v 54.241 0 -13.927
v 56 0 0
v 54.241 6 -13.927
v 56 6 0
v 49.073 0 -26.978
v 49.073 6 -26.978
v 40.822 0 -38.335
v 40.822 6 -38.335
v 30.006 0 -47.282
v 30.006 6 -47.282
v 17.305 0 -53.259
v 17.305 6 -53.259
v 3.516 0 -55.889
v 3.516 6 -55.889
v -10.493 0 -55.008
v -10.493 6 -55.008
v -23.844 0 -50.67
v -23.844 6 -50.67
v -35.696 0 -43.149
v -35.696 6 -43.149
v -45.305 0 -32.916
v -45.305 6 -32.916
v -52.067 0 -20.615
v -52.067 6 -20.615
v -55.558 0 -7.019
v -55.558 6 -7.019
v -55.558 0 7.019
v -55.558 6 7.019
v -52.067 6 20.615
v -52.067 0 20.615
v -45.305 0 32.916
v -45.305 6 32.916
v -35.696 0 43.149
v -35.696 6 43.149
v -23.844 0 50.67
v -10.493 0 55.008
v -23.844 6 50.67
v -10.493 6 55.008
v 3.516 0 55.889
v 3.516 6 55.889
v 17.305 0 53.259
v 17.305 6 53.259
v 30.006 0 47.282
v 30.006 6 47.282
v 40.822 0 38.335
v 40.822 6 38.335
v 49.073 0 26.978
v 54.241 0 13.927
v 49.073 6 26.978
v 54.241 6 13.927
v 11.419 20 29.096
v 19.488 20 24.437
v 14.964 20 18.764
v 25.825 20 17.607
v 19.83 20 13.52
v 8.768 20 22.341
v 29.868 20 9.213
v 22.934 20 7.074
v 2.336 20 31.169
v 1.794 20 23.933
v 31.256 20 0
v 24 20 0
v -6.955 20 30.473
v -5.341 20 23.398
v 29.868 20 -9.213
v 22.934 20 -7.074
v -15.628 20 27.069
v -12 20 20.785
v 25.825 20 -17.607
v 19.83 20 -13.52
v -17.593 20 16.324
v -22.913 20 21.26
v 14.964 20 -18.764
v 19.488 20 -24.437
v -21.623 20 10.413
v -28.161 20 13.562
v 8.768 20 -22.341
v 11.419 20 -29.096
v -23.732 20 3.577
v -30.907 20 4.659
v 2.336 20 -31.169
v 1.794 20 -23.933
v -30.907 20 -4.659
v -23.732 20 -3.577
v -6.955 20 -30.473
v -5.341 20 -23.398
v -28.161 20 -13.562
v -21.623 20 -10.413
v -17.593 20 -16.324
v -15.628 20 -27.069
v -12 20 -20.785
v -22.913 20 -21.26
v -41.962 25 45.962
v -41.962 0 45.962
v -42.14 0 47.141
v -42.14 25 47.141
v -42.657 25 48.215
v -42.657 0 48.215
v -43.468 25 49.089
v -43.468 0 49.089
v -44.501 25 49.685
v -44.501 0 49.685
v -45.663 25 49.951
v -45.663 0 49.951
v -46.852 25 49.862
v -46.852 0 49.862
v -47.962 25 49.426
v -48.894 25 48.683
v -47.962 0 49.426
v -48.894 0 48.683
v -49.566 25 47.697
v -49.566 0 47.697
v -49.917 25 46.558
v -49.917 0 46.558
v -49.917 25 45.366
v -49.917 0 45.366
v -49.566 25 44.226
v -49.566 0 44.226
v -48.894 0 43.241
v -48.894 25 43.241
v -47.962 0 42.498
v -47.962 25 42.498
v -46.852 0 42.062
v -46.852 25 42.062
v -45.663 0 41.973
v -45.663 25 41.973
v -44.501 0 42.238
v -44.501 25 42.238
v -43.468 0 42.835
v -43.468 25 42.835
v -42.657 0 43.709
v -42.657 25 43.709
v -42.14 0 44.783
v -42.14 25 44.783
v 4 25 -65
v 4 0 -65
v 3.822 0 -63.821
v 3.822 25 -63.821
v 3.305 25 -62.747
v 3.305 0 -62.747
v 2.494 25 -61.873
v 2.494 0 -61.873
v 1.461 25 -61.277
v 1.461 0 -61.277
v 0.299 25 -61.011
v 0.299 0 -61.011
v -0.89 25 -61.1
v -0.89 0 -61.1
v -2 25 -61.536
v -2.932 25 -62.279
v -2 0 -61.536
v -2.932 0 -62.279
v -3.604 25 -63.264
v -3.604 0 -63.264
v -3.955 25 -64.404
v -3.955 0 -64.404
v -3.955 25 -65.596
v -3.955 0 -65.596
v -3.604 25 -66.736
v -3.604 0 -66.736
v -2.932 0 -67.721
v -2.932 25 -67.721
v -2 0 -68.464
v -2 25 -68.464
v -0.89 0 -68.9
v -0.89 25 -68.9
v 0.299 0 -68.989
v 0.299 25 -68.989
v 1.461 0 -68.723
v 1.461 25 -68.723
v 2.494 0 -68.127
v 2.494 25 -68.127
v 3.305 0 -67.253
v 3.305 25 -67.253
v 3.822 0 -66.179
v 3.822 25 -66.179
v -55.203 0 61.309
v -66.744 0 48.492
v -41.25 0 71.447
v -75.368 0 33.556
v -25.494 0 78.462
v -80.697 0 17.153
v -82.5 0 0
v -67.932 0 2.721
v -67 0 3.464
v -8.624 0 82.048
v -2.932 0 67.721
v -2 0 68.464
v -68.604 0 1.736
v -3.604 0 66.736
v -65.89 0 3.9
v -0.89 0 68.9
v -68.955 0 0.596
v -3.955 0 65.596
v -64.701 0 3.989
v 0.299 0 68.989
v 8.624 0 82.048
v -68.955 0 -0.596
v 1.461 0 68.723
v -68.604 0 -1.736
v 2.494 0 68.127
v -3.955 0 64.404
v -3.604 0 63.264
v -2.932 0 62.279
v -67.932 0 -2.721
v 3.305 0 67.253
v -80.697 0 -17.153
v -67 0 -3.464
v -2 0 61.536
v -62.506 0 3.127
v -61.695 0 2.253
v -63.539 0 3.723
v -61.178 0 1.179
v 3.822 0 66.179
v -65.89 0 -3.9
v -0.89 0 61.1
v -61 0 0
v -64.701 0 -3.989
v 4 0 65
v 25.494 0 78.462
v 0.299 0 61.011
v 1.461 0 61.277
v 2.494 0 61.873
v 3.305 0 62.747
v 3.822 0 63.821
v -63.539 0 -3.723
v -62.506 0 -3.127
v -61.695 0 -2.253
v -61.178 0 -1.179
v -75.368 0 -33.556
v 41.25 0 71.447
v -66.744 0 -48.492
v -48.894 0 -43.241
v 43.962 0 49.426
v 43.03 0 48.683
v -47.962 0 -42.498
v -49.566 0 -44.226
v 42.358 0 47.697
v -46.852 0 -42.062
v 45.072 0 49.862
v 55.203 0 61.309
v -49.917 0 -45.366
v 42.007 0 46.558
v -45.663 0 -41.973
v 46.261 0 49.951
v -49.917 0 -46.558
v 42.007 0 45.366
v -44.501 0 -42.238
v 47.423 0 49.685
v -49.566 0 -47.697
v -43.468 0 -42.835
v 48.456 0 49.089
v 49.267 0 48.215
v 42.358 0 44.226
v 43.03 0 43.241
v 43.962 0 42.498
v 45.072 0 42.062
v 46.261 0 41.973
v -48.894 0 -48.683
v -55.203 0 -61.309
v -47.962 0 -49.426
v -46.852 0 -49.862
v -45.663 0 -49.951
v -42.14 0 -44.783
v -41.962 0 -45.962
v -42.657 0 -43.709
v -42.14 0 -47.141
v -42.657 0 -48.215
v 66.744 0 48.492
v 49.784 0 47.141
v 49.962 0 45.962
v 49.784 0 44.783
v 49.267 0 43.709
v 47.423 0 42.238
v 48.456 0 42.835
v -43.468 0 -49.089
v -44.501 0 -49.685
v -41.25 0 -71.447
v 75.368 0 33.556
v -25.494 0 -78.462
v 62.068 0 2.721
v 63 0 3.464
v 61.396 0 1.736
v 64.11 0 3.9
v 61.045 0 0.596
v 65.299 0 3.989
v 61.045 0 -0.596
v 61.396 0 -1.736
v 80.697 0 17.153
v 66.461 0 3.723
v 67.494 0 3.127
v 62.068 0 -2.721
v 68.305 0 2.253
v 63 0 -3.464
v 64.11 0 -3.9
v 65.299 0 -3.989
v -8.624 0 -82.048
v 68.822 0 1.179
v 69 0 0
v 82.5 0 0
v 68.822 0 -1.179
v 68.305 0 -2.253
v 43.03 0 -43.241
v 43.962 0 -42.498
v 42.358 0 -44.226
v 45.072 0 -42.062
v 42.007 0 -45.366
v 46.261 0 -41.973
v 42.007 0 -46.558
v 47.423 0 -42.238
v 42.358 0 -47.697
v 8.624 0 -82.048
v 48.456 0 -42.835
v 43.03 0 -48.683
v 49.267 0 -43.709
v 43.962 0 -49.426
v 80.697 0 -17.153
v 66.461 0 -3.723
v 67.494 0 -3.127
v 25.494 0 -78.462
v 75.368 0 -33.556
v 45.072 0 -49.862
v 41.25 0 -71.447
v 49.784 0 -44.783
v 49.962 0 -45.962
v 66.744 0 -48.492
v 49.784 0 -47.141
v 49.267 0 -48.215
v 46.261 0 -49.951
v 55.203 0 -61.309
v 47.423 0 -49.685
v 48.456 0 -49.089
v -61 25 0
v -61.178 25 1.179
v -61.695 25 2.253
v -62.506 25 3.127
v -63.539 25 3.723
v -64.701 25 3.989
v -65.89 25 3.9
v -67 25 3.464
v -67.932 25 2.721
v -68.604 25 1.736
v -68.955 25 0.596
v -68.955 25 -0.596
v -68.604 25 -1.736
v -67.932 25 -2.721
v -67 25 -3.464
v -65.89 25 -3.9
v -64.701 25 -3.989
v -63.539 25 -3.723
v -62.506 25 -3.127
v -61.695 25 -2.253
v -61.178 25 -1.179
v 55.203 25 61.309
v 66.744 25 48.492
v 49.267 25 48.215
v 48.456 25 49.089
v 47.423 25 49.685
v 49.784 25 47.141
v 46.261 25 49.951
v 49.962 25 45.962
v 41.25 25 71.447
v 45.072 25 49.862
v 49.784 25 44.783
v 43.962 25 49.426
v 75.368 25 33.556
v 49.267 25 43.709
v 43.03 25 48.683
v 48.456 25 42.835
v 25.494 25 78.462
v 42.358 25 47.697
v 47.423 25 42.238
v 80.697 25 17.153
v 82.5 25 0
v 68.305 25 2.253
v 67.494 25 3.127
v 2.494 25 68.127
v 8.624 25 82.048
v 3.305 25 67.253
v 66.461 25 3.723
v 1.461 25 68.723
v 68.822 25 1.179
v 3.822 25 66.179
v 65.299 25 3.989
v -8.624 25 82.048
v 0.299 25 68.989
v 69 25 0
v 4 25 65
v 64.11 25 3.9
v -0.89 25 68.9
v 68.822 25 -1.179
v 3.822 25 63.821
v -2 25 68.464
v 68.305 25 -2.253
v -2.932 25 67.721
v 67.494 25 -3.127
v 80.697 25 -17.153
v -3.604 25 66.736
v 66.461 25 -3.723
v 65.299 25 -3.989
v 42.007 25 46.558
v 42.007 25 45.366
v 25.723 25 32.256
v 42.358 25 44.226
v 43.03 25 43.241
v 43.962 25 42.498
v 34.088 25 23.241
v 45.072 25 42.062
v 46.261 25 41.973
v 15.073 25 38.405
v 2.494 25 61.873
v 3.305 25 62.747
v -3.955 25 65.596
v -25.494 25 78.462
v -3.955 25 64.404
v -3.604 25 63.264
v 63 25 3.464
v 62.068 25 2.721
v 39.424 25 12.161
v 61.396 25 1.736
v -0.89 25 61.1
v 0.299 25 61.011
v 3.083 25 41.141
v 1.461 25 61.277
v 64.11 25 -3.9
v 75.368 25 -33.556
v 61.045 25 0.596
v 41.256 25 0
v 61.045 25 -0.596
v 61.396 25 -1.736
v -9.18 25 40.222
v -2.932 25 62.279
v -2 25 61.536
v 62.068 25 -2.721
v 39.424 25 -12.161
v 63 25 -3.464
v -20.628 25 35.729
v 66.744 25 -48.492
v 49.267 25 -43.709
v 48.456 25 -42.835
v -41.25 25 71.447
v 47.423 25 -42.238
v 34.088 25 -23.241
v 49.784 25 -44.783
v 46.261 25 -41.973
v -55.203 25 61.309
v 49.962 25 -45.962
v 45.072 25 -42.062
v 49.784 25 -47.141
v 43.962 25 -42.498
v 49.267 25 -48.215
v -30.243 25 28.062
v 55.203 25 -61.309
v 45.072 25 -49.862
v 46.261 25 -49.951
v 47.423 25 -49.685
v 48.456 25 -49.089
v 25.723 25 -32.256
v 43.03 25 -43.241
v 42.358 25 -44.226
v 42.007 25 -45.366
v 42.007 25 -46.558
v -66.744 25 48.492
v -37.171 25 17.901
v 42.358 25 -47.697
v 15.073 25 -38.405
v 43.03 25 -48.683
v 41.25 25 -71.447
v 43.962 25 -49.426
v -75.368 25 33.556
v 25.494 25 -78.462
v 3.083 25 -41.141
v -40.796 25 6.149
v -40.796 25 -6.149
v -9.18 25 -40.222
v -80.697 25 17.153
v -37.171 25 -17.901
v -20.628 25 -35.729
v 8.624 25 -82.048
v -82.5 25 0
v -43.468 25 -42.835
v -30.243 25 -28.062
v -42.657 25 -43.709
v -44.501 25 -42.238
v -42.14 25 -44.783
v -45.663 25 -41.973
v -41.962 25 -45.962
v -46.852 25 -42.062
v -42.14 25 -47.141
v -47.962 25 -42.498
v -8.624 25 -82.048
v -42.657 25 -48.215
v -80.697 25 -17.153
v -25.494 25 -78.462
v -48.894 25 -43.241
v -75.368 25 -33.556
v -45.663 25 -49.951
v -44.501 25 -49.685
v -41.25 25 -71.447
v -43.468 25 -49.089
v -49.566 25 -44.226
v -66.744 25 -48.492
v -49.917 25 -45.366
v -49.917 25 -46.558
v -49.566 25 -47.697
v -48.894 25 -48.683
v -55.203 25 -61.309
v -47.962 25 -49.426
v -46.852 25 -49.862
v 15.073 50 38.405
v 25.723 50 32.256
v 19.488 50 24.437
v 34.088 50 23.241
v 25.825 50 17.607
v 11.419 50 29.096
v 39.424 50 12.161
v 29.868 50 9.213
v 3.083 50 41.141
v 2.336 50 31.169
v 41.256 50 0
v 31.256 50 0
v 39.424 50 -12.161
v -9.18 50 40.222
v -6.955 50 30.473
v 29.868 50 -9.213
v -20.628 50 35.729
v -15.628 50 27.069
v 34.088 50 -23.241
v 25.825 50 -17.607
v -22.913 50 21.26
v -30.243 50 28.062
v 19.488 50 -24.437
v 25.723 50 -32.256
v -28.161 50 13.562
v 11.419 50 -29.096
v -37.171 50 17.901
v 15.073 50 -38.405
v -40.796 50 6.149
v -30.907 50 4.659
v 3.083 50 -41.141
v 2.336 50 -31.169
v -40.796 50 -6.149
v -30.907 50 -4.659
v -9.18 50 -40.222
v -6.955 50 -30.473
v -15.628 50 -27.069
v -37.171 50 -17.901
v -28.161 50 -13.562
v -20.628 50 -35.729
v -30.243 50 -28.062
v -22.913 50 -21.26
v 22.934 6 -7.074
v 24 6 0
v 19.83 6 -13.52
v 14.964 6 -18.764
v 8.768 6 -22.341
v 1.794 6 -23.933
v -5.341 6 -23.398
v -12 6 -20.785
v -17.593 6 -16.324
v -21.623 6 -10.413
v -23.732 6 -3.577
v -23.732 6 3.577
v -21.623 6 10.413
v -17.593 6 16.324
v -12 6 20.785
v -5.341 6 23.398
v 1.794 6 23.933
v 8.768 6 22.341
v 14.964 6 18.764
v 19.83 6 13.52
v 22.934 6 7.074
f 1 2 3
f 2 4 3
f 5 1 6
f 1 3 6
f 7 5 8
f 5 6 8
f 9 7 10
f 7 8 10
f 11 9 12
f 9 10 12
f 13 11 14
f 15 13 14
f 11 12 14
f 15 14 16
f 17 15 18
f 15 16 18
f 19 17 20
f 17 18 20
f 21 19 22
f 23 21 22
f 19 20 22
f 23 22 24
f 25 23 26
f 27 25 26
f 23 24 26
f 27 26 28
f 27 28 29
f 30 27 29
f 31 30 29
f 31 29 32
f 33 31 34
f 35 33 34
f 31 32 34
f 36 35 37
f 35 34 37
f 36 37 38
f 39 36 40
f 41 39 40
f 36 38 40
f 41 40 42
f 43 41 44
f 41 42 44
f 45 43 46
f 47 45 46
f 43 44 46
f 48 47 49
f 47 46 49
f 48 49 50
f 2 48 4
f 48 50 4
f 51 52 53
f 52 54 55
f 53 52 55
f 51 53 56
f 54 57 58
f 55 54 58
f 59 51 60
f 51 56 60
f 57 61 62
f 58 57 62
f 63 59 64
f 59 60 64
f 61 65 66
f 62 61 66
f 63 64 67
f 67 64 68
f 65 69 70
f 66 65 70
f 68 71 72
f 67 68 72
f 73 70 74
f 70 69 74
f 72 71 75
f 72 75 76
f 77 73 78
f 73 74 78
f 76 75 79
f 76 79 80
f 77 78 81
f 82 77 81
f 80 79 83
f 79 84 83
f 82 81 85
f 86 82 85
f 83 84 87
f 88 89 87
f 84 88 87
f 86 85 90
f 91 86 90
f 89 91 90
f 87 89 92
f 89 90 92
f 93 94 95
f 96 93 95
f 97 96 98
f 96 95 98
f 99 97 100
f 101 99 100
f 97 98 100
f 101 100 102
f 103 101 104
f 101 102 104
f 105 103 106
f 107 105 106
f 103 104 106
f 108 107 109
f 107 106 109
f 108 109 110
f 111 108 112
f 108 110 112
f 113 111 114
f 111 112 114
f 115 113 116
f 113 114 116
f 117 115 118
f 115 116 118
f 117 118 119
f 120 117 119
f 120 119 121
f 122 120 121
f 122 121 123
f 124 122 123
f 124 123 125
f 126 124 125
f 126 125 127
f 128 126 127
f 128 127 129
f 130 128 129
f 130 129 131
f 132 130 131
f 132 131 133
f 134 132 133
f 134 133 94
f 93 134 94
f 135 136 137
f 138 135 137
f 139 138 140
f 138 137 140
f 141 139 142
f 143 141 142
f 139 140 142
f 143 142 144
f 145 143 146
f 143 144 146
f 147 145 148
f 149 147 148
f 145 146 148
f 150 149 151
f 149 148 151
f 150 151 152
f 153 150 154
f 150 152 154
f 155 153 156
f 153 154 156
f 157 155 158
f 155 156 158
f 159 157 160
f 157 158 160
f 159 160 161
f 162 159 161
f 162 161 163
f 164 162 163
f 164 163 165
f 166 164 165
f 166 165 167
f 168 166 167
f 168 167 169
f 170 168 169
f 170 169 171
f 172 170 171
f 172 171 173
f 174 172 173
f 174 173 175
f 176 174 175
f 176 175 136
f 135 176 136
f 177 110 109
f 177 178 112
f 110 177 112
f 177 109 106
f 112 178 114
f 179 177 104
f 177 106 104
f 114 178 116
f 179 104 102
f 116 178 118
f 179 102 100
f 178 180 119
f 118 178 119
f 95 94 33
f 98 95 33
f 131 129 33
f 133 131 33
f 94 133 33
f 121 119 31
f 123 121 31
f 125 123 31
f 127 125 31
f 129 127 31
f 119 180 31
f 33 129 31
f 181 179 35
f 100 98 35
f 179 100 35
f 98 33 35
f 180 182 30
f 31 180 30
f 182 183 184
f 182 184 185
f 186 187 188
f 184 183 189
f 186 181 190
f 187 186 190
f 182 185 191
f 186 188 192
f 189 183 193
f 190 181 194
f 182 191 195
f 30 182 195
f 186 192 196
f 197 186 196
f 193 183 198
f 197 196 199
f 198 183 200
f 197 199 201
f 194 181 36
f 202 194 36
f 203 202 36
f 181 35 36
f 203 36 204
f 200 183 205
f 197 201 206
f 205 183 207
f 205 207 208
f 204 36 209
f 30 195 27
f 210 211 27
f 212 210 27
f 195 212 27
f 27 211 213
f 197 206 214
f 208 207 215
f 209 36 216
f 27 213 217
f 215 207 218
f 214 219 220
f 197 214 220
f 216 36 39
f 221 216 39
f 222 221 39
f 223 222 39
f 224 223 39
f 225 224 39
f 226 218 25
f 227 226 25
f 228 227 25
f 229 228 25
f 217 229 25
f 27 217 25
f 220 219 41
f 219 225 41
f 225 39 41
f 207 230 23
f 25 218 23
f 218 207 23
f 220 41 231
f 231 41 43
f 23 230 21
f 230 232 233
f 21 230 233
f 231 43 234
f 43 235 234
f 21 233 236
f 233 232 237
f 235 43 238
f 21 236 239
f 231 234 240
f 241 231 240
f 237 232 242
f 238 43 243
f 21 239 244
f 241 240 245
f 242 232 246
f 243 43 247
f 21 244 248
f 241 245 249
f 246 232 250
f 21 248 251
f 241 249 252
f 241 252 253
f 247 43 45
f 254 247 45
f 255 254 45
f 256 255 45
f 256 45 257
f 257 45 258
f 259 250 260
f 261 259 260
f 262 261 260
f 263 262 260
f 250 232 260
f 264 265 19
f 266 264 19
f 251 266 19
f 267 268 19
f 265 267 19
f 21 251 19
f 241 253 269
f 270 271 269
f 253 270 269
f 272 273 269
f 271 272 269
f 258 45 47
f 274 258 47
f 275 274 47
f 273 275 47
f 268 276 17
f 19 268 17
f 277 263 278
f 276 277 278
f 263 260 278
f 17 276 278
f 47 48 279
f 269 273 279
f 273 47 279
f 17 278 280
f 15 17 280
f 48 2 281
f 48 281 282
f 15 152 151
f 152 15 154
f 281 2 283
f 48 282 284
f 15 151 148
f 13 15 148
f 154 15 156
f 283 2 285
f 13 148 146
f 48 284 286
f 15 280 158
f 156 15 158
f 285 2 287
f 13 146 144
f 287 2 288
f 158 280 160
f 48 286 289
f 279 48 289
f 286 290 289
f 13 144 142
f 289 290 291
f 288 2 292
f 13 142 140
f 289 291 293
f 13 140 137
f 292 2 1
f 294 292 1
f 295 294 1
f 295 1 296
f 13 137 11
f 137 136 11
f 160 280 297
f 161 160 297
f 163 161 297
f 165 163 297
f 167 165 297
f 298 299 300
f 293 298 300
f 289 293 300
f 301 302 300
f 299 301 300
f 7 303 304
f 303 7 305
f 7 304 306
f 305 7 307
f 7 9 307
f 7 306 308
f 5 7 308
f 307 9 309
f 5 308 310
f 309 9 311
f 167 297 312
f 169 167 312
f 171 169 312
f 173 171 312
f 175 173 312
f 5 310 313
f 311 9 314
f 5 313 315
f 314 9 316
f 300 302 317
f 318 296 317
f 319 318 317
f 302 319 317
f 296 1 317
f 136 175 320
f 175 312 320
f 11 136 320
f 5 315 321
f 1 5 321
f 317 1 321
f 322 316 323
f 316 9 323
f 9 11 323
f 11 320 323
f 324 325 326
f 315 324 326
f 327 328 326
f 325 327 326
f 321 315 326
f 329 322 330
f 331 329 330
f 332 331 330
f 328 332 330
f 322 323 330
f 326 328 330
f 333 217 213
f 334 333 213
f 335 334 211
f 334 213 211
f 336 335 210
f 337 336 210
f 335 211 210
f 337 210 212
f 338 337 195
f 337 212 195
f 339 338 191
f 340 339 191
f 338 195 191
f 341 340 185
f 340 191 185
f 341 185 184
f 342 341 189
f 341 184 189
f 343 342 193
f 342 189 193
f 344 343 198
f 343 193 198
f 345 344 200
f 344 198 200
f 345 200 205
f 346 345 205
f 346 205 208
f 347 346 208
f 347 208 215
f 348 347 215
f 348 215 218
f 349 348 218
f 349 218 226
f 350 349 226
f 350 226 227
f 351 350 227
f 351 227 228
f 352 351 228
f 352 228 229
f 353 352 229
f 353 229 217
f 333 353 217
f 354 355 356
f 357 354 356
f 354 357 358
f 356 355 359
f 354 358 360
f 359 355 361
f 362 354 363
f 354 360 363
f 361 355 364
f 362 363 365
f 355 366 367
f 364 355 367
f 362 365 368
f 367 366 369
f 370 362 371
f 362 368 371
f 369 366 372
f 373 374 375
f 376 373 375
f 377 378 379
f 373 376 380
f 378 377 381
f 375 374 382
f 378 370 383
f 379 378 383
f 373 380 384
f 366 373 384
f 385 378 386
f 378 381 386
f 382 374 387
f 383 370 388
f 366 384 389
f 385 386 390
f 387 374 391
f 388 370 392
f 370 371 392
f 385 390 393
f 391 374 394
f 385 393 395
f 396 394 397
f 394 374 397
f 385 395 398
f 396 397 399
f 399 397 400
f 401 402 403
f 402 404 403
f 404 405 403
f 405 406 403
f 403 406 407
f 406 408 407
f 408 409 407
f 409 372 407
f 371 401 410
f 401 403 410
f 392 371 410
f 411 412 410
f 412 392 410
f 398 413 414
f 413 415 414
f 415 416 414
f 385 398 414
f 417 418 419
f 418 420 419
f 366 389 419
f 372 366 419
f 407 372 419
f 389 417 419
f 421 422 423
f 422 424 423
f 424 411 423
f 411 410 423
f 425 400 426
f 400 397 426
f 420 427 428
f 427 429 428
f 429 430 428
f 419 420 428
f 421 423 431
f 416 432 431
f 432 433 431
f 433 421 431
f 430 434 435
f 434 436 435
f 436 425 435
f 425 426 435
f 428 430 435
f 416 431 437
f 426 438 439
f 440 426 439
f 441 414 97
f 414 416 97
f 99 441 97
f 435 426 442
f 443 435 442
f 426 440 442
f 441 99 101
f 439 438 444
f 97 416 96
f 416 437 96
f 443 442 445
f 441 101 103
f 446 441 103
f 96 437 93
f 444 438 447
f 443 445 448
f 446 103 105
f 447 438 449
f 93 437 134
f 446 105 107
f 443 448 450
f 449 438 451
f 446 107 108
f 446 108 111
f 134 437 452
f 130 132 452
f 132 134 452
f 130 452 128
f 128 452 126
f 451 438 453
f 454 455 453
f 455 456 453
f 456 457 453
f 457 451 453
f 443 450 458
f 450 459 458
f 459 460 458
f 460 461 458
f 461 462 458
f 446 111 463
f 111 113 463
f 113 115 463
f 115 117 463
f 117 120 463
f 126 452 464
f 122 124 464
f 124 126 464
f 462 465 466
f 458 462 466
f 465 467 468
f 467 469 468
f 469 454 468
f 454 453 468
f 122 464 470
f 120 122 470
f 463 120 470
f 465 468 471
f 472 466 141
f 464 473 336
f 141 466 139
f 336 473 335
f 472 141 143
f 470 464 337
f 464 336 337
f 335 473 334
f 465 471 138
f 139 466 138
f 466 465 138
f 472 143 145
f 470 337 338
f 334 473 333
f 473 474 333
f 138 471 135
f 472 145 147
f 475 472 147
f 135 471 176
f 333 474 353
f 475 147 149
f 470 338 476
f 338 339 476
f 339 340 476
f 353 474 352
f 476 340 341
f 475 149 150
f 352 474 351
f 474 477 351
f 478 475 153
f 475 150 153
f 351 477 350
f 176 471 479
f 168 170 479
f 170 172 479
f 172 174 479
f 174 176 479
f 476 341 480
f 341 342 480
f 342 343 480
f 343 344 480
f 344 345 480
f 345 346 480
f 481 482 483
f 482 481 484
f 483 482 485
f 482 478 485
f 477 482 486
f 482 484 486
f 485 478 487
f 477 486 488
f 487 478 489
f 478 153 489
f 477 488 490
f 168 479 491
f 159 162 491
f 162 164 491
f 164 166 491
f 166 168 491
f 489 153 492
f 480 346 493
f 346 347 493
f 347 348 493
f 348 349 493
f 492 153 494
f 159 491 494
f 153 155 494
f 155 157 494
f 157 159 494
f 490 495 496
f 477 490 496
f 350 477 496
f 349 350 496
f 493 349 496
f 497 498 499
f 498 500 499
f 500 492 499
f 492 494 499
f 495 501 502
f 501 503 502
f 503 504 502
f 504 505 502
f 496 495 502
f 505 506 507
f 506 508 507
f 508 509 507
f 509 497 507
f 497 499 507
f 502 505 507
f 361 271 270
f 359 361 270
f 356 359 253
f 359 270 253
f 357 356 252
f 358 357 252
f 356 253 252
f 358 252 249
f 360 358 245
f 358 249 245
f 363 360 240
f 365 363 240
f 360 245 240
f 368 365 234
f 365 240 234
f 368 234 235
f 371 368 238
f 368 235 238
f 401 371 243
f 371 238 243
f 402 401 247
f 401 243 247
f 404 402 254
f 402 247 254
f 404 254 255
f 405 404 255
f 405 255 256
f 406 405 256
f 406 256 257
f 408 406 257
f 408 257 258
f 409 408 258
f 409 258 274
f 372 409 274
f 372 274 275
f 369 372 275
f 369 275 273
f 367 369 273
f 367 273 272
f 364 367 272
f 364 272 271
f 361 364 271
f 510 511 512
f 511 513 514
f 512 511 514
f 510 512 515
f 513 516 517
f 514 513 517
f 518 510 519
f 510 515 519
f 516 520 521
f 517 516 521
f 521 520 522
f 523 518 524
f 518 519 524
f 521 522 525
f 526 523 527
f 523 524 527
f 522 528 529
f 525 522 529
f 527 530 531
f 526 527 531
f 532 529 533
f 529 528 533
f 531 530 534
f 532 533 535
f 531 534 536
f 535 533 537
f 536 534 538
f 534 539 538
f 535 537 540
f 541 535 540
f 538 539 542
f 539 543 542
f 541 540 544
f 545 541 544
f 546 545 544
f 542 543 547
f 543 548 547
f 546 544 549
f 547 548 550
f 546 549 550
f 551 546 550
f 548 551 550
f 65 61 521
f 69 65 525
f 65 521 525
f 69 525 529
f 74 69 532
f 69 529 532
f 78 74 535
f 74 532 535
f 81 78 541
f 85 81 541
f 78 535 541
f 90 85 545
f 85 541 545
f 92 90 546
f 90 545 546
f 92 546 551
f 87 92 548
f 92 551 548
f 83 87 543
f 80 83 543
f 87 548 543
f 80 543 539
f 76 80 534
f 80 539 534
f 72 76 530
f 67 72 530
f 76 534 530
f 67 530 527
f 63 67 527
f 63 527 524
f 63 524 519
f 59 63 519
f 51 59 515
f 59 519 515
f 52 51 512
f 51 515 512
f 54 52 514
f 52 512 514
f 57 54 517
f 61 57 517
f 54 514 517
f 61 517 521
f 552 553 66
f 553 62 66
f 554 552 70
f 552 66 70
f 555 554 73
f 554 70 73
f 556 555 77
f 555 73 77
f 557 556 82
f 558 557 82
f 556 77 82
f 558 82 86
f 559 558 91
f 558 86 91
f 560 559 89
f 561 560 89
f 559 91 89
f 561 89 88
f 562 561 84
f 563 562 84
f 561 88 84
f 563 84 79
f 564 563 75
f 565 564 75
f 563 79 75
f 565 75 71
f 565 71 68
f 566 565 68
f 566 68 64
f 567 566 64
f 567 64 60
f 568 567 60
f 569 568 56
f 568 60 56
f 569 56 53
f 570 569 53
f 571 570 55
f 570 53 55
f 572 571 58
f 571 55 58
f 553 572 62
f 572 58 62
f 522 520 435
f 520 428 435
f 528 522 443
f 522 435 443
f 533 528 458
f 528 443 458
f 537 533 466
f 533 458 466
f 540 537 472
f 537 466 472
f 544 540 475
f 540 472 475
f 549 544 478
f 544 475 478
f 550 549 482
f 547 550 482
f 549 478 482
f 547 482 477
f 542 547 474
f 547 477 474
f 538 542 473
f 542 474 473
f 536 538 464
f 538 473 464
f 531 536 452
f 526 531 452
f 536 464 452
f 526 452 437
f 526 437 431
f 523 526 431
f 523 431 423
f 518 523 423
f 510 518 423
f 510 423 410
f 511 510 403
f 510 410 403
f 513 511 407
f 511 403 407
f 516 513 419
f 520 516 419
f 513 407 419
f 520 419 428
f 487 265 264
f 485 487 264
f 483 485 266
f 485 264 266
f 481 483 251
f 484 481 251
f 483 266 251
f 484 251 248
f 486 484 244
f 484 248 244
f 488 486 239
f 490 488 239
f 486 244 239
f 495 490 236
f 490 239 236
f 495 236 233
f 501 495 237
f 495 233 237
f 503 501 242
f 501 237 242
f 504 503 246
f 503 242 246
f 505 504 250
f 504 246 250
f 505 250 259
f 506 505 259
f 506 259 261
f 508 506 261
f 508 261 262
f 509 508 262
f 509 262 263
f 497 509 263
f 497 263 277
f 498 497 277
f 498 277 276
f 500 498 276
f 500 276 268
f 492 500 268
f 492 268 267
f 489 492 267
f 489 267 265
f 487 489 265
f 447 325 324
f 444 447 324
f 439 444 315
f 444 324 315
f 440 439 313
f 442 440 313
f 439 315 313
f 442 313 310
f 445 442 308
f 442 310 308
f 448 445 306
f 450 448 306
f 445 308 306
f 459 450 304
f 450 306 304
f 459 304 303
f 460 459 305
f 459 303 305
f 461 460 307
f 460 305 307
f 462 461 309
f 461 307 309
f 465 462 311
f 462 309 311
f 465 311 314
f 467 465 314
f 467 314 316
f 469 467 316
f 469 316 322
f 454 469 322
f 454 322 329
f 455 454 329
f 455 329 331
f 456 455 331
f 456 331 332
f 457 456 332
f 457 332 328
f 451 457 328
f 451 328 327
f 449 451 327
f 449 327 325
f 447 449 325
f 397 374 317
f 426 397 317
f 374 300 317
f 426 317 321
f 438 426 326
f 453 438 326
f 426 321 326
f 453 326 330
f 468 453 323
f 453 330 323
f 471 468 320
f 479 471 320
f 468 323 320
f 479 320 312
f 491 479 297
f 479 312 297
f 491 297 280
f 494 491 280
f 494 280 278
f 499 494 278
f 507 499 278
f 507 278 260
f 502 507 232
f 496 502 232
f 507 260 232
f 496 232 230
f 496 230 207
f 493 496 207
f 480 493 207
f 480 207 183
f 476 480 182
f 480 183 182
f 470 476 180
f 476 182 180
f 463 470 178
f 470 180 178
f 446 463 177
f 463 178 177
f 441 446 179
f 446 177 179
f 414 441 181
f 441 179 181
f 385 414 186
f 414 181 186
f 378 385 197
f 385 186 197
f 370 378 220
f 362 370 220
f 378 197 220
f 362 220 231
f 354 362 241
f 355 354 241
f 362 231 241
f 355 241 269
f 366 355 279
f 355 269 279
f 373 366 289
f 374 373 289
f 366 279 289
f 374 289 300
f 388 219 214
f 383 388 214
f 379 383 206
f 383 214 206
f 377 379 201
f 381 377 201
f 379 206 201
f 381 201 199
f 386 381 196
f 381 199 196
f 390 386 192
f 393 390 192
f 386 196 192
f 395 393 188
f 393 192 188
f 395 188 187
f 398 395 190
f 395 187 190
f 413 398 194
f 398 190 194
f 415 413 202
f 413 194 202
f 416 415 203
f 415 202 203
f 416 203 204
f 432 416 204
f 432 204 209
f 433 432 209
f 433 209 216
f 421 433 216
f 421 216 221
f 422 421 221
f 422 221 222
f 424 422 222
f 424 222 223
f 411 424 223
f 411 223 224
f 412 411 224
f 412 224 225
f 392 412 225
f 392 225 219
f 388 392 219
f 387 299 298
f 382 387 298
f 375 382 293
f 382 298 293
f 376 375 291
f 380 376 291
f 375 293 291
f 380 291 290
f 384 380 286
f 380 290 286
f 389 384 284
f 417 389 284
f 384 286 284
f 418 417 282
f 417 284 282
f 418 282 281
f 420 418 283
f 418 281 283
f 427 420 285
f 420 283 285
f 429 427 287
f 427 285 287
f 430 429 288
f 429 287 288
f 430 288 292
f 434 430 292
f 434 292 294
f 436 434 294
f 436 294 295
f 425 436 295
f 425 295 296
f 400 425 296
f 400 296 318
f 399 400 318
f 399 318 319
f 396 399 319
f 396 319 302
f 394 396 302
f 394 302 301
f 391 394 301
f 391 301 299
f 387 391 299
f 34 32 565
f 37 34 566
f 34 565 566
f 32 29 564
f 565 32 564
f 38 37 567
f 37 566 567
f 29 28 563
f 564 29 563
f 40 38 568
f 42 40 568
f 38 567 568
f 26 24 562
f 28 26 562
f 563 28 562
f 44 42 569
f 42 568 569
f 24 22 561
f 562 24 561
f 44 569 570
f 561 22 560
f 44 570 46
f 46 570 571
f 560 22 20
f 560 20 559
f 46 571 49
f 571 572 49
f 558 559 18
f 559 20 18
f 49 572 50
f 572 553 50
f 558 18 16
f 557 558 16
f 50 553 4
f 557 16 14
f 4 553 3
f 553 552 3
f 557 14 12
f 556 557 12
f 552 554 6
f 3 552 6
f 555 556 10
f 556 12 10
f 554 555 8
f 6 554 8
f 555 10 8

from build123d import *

# Parameters (mm, degrees)
SKETCH3_R          = 4
CUT_EXTRUDE2_DEPTH = 51


with BuildPart() as part:
    # Sketch2 → Revolve1 (revolve)
    with BuildSketch(Plane.XY):
        Polygon((82.5, 0), (56, 0), (56, 6), (24, 6), (24, 20), (31.256462168, 20), (31.256462168, 50), (41.256462168, 50), (41.256462168, 25), (82.5, 25), align=None)
    revolve(axis=Axis((0, 0, 0), (0, 1, 0)))

    # Sketch3 → Cut-Extrude2 (cut, through all)
    with BuildSketch(Plane.XZ):
        with Locations((65, 0)):
            Circle(SKETCH3_R)
        with Locations((45.961940777, -45.961940777)):
            Circle(SKETCH3_R)
        with Locations((0, -65)):
            Circle(SKETCH3_R)
        with Locations((-45.961940777, -45.961940777)):
            Circle(SKETCH3_R)
        with Locations((-65, 0)):
            Circle(SKETCH3_R)
        with Locations((-45.961940777, 45.961940777)):
            Circle(SKETCH3_R)
        with Locations((0, 65)):
            Circle(SKETCH3_R)
        with Locations((45.961940777, 45.961940777)):
            Circle(SKETCH3_R)
    extrude(amount=-CUT_EXTRUDE2_DEPTH, mode=Mode.SUBTRACT)


solid = part.part
